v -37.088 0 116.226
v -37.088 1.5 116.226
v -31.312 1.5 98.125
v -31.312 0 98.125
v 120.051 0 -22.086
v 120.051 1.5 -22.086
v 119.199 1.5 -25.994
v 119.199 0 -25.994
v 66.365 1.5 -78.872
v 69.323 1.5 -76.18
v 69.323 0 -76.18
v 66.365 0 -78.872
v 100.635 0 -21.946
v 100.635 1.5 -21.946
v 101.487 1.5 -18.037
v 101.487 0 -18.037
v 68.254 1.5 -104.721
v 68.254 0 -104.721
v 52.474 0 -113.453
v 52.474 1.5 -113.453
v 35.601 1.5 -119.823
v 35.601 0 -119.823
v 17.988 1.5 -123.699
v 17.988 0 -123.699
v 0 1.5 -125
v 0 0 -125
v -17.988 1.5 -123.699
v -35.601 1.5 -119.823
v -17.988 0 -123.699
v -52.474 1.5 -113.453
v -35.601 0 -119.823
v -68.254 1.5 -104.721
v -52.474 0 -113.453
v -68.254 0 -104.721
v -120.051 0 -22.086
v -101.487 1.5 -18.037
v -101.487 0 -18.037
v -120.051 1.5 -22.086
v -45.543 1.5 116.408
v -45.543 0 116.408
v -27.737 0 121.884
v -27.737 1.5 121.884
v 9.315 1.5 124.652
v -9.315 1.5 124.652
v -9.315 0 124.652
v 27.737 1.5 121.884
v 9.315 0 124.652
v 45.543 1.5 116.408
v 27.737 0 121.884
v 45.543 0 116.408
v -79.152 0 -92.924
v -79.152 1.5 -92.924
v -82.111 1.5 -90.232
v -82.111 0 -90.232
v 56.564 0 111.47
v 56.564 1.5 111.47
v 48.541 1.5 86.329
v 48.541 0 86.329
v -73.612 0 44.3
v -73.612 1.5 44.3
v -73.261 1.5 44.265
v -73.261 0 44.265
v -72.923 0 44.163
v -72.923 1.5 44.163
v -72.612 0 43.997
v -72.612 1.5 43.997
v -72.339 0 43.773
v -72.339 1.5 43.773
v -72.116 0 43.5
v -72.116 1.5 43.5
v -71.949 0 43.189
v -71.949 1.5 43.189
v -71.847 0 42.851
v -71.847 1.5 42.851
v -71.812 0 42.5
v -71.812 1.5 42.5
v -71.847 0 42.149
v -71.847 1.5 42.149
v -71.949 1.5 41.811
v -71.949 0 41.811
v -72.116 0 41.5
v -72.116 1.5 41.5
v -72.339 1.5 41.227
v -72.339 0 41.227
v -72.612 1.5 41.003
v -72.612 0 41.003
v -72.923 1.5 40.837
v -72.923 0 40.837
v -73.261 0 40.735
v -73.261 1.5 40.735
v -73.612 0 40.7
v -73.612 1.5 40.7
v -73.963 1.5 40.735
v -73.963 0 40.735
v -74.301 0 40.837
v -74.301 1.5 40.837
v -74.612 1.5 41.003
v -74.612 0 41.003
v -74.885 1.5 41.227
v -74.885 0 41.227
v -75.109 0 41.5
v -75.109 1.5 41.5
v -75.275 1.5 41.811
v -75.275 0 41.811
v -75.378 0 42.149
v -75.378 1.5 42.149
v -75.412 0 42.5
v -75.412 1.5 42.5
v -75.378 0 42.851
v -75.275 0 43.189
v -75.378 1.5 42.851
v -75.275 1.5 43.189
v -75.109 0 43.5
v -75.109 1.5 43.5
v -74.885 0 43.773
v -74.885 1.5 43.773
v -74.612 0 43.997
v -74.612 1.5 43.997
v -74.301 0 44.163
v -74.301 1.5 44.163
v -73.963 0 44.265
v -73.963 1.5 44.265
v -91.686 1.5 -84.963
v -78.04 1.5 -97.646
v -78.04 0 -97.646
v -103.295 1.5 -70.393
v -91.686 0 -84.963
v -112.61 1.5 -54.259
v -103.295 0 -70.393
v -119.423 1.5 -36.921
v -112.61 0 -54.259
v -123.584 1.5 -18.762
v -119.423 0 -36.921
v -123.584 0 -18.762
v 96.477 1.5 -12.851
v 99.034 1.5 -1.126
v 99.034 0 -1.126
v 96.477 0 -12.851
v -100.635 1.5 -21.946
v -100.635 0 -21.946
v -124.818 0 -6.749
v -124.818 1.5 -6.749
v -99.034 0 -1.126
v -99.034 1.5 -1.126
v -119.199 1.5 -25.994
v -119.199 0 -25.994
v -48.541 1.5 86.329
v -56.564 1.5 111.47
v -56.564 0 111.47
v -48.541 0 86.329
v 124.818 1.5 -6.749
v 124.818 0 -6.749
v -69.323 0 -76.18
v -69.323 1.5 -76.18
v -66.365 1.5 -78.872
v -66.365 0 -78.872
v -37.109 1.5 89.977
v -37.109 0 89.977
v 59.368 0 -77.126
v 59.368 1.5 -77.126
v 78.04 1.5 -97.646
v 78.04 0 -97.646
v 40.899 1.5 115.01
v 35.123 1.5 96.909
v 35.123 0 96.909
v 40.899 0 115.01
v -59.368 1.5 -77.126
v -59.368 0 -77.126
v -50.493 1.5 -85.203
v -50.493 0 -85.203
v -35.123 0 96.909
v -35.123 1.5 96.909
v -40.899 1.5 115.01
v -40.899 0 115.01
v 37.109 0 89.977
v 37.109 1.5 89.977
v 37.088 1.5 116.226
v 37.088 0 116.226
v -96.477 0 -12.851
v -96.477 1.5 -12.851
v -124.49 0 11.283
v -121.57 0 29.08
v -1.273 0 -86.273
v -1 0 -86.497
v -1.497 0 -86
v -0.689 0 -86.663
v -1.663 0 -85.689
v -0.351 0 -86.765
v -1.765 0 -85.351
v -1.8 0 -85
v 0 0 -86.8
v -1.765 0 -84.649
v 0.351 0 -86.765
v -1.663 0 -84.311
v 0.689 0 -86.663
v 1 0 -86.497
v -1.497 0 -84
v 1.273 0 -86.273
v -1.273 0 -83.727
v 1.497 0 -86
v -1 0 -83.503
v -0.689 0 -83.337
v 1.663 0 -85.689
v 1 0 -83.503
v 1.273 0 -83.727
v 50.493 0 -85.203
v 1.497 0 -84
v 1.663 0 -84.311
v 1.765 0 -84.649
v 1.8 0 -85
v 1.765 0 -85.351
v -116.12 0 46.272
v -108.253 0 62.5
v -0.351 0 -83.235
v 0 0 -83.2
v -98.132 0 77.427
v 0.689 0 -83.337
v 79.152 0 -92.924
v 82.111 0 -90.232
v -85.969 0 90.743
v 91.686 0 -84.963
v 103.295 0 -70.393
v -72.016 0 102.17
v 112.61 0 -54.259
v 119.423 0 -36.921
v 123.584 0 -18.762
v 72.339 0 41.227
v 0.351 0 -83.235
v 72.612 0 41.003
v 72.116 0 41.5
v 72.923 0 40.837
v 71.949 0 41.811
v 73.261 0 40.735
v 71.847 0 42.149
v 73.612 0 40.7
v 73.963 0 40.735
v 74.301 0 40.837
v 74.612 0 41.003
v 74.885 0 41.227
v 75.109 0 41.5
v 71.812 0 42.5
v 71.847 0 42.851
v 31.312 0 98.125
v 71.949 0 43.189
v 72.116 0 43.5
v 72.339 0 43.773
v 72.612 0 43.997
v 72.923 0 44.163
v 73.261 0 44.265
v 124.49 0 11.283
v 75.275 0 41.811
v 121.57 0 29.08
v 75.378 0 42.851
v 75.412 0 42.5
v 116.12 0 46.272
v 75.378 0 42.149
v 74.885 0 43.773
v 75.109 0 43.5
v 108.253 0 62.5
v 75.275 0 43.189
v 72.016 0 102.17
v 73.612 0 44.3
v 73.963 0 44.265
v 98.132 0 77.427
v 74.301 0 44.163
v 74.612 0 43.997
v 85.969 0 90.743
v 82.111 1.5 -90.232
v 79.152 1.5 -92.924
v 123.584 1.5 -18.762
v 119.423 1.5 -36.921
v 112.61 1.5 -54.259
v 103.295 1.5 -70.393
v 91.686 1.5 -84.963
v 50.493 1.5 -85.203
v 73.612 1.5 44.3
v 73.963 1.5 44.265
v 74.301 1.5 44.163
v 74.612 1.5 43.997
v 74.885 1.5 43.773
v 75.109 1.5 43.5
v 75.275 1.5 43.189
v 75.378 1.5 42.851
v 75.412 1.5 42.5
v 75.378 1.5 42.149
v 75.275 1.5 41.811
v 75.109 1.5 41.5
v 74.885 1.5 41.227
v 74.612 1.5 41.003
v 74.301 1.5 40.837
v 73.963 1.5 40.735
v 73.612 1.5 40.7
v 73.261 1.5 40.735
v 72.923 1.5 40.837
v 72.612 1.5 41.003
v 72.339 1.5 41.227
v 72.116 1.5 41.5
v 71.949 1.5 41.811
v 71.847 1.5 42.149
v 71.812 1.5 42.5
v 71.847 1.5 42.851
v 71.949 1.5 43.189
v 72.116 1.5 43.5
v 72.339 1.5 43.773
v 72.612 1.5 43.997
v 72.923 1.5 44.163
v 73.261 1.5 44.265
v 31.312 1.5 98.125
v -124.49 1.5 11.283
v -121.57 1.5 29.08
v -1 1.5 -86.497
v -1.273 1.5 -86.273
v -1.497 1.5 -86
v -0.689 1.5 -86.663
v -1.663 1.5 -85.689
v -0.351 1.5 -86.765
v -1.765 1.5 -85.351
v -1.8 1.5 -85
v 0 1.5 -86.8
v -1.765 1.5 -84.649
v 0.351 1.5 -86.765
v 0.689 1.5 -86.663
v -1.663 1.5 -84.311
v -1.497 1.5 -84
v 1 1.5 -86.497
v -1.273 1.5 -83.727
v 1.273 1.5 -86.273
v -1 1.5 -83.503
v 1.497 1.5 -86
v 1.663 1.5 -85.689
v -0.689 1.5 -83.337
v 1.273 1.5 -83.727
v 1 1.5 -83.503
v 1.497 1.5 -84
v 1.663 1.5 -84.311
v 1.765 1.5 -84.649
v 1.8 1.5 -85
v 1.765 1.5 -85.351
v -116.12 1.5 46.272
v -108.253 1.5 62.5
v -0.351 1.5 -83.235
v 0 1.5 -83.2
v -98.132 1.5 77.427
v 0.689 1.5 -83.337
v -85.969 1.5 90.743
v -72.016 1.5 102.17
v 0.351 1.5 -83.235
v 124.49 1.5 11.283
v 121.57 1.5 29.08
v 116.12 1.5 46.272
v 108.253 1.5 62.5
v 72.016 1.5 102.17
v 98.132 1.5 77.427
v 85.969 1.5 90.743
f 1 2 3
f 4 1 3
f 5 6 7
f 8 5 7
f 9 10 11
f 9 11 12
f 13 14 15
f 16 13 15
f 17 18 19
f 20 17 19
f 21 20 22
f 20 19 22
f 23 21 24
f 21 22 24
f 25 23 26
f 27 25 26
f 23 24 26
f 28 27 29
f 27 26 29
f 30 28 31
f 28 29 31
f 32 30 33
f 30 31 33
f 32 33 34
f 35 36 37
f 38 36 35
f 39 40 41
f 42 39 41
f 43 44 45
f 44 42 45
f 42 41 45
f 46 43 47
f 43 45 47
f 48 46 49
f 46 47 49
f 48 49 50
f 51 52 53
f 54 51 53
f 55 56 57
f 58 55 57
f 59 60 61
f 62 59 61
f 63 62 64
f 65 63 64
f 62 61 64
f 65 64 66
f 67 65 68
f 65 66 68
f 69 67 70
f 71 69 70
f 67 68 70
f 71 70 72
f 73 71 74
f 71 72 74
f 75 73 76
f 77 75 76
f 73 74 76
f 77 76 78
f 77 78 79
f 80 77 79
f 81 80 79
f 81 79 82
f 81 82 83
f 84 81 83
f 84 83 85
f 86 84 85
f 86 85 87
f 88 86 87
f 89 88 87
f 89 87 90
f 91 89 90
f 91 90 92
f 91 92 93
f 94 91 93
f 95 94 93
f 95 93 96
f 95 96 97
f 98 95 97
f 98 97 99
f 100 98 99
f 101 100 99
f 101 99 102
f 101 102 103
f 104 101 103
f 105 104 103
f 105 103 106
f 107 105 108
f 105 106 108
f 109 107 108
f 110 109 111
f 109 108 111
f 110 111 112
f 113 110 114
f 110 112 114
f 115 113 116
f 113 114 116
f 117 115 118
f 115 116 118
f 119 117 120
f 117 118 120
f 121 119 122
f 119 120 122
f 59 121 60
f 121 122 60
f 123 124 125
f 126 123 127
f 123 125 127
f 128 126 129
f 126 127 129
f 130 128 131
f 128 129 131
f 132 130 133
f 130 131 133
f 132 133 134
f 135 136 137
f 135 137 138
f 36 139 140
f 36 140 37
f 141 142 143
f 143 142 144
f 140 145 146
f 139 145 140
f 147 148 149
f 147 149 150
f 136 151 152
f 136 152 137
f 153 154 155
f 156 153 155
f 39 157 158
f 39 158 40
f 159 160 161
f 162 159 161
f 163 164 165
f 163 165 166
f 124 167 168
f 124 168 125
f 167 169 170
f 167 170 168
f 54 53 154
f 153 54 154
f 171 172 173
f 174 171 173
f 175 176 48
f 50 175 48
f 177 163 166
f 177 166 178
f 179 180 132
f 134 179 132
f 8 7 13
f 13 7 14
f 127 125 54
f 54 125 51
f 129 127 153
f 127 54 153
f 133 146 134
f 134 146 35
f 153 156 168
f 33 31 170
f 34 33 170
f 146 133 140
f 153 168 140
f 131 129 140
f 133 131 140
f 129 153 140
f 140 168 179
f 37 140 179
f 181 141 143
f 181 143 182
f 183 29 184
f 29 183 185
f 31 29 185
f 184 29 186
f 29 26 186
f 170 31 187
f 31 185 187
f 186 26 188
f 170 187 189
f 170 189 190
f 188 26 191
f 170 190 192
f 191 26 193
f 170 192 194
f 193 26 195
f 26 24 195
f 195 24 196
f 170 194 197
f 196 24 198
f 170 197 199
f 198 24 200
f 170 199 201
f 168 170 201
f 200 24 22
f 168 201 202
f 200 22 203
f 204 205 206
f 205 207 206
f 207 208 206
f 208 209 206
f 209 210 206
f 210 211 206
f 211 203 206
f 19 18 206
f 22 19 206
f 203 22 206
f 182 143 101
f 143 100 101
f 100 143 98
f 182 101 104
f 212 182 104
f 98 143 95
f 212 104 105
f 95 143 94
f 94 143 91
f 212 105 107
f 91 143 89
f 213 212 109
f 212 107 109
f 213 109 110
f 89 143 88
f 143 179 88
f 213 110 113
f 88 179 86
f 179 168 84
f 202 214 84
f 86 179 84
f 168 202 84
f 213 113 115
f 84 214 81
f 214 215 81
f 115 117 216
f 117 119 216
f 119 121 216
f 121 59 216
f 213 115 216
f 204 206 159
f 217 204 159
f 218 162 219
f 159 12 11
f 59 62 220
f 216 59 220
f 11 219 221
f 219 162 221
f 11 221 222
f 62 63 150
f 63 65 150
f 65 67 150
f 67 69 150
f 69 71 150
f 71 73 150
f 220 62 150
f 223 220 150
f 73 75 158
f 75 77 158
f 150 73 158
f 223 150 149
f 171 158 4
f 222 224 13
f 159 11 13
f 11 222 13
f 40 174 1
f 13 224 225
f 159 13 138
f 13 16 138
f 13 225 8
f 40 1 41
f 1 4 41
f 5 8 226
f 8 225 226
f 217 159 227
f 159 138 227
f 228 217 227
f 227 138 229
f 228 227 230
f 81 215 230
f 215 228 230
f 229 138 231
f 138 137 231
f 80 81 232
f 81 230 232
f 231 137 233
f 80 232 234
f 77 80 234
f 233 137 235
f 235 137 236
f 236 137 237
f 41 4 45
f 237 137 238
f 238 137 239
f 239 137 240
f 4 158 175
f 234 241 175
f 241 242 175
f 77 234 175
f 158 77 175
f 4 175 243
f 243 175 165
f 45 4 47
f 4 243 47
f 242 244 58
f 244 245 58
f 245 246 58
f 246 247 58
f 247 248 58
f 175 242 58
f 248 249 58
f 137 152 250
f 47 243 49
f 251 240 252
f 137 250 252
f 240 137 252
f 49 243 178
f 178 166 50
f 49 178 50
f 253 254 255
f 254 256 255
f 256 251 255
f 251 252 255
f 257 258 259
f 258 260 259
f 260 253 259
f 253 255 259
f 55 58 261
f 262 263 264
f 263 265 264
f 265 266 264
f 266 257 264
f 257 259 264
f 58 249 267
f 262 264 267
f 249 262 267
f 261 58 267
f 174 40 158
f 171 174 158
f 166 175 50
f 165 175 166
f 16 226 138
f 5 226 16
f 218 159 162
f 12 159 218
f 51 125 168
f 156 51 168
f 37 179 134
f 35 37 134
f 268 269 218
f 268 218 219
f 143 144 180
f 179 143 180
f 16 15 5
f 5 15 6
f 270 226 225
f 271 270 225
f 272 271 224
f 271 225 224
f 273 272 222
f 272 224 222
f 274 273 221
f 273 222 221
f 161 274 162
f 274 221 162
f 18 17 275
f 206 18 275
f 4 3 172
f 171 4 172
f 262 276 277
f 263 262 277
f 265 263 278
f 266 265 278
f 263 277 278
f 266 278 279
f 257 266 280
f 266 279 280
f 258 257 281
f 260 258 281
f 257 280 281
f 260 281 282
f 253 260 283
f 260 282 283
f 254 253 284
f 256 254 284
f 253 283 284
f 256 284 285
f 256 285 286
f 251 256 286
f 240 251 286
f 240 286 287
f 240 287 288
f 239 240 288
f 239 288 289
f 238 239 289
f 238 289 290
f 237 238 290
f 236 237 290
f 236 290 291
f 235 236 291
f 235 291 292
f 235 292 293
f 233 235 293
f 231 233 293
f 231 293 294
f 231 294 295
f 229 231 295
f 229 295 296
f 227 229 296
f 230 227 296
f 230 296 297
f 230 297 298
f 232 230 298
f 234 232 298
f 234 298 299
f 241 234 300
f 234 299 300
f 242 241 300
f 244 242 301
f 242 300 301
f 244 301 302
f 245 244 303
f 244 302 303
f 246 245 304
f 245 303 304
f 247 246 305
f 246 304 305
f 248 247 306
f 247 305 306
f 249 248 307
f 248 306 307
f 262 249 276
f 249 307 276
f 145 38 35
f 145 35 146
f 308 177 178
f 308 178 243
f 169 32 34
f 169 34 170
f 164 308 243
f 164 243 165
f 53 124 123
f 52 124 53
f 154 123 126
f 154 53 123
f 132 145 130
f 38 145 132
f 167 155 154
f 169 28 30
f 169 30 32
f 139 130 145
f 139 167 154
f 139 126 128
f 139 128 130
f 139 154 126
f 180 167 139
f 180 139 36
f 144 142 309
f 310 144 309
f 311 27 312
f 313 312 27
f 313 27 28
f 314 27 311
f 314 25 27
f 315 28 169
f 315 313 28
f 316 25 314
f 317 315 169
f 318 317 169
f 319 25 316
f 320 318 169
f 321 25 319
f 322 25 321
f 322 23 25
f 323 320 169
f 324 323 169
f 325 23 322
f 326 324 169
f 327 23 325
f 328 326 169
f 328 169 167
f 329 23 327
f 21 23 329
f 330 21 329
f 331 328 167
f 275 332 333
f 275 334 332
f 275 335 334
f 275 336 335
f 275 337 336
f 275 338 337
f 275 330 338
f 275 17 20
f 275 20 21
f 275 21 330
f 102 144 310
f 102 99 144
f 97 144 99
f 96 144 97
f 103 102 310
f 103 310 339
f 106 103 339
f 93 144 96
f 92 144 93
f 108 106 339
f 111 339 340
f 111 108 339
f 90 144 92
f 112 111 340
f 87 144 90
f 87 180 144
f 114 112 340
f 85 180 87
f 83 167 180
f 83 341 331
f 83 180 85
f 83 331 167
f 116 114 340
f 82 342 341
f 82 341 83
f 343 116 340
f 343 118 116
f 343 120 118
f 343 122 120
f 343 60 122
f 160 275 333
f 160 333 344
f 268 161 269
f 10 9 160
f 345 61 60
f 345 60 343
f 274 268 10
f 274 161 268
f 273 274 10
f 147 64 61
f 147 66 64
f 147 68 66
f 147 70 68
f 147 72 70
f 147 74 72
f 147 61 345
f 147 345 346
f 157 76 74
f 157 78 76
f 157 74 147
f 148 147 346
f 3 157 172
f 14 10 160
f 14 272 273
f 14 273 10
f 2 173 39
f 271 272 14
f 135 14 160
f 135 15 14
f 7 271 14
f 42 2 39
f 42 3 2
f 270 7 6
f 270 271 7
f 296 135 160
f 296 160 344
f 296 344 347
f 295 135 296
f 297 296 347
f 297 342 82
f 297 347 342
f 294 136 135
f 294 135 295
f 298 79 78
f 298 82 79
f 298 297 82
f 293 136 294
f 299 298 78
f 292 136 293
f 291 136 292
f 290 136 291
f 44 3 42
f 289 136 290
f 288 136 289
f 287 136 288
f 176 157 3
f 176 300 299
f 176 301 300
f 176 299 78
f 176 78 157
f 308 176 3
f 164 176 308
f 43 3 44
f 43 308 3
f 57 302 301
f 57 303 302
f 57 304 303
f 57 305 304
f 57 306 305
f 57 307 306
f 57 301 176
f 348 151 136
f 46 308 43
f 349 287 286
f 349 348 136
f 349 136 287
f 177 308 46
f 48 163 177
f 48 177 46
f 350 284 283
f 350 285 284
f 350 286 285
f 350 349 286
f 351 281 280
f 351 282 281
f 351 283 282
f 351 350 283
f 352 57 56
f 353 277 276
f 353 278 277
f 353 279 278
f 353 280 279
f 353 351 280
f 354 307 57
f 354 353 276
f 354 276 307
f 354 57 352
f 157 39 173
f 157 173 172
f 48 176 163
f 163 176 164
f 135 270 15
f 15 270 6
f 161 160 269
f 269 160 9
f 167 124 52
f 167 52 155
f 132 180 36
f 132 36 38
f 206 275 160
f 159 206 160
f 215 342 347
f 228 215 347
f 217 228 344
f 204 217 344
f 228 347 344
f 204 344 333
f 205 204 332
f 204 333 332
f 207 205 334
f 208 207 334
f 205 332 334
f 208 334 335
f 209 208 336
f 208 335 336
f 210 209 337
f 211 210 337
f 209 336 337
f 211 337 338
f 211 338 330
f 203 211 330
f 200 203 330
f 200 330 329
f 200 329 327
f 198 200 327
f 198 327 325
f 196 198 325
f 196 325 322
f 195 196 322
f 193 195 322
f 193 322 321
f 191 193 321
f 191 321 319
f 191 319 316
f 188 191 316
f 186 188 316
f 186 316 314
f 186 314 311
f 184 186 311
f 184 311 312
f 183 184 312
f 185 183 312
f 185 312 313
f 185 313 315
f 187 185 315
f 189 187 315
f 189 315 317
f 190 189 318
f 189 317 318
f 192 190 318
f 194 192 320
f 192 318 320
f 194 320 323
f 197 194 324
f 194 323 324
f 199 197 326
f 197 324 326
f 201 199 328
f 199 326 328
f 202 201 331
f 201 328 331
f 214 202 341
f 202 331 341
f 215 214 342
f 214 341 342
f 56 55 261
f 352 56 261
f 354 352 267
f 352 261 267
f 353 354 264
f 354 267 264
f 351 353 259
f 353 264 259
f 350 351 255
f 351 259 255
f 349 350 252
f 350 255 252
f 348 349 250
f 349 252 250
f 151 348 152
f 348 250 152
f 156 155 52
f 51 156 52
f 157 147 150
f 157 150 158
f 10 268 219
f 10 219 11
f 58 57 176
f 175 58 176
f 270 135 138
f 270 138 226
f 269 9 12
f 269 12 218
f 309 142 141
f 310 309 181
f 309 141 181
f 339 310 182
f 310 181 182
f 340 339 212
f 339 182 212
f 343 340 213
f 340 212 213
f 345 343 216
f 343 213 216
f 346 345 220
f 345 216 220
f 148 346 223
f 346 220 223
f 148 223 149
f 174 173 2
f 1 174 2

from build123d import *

# Parameters (mm, degrees)
SKETCH2_R           = 125
BOSS_EXTRUDE1_DEPTH = 1.5
SKETCH3_W           = 3
SKETCH3_H           = 19
CUT_EXTRUDE1_DEPTH  = 177.783059143
SKETCH4_R           = 1.8
CUT_EXTRUDE2_DEPTH  = 177.783059143
CUT_EXTRUDE5_DEPTH  = 177.783059143
CIRPATTERN2_COUNT   = 3


with BuildPart() as part:
    # Sketch2 → Boss-Extrude1 (new body)
    with BuildSketch(Plane(origin=(0, 0, 0), x_dir=(1, 0, 0), z_dir=(0, 1, 0))):
        with Locations(Location((0, 0, 0), (0, 0, 270))):
            Circle(SKETCH2_R)
    extrude(amount=BOSS_EXTRUDE1_DEPTH)

    # Sketch3 → Cut-Extrude1 (cut, through all)
    with BuildSketch(Plane(origin=(0, 1.5, 0), x_dir=(1, 0, 0), z_dir=(0, 1, 0))):
        with Locations((-268.691654721, -368.173324402)):
            Rectangle(SKETCH3_W, SKETCH3_H)
        Polygon((31.312, -98.125219266), (35.122688127, -96.909219266), (40.898688127, -115.009987868), (37.088, -116.225987868), align=None)
        Polygon((-37.088, -116.225987868), (-31.312, -98.125219266), (-35.122688127, -96.909219266), (-40.898688127, -115.009987868), align=None)
        Polygon((-82.110658074, 90.23214411), (-69.322932636, 76.179597076), (-66.364501682, 78.8717498), (-79.15222712, 92.924296834), align=None)
        Polygon((-100.634932636, 21.94562219), (-101.487189809, 18.037469466), (-120.050915246, 22.085691035), (-119.198658074, 25.993843759), align=None)
        Polygon((119.198658074, 25.993843759), (100.634932636, 21.94562219), (101.487189809, 18.037469466), (120.050915246, 22.085691035), align=None)
        Polygon((69.322932636, 76.179597076), (66.364501682, 78.8717498), (79.15222712, 92.924296834), (82.110658074, 90.23214411), align=None)
    extrude(amount=-CUT_EXTRUDE1_DEPTH, mode=Mode.SUBTRACT)

    # Sketch4 → Cut-Extrude2 (cut, through all)
    with BuildSketch(Plane(origin=(0, 1.5, 0), x_dir=(1, 0, 0), z_dir=(0, 1, 0))):
        with Locations(Location((0, 85, 0), (0, 0, 270))):
            Circle(SKETCH4_R)
        with Locations(Location((73.612159322, -42.5, 0), (0, 0, 270))):
            Circle(SKETCH4_R)
        with Locations(Location((-73.612159322, -42.5, 0), (0, 0, 270))):
            Circle(SKETCH4_R)
    extrude(amount=-CUT_EXTRUDE2_DEPTH, mode=Mode.SUBTRACT)

    # Sketch6 → Cut-Extrude5 (cut, through all)
    with BuildSketch(Plane(origin=(0, 1.5, 0), x_dir=(1, 0, 0), z_dir=(0, 1, 0))):
        Polygon((-55.992533724, -149.153029157), (-67.424598105, -145.505029157), (-48.541440634, -86.329187076), (-37.109376254, -89.977187076), align=None)
        Polygon((67.424598105, -145.505029157), (48.541440634, -86.329187076), (37.109376254, -89.977187076), (55.992533724, -149.153029157), align=None)
    cut_extrude5 = extrude(amount=-CUT_EXTRUDE5_DEPTH, mode=Mode.SUBTRACT)

    # CirPattern2: Cut-Extrude5 ×3 about axis
    cirpattern2_axis = Axis((0, 0, 0), (0, 1, 0))
    for i in range(1, CIRPATTERN2_COUNT):
        add(cut_extrude5.rotate(cirpattern2_axis, i * 360 / CIRPATTERN2_COUNT), mode=Mode.SUBTRACT)


solid = part.part
